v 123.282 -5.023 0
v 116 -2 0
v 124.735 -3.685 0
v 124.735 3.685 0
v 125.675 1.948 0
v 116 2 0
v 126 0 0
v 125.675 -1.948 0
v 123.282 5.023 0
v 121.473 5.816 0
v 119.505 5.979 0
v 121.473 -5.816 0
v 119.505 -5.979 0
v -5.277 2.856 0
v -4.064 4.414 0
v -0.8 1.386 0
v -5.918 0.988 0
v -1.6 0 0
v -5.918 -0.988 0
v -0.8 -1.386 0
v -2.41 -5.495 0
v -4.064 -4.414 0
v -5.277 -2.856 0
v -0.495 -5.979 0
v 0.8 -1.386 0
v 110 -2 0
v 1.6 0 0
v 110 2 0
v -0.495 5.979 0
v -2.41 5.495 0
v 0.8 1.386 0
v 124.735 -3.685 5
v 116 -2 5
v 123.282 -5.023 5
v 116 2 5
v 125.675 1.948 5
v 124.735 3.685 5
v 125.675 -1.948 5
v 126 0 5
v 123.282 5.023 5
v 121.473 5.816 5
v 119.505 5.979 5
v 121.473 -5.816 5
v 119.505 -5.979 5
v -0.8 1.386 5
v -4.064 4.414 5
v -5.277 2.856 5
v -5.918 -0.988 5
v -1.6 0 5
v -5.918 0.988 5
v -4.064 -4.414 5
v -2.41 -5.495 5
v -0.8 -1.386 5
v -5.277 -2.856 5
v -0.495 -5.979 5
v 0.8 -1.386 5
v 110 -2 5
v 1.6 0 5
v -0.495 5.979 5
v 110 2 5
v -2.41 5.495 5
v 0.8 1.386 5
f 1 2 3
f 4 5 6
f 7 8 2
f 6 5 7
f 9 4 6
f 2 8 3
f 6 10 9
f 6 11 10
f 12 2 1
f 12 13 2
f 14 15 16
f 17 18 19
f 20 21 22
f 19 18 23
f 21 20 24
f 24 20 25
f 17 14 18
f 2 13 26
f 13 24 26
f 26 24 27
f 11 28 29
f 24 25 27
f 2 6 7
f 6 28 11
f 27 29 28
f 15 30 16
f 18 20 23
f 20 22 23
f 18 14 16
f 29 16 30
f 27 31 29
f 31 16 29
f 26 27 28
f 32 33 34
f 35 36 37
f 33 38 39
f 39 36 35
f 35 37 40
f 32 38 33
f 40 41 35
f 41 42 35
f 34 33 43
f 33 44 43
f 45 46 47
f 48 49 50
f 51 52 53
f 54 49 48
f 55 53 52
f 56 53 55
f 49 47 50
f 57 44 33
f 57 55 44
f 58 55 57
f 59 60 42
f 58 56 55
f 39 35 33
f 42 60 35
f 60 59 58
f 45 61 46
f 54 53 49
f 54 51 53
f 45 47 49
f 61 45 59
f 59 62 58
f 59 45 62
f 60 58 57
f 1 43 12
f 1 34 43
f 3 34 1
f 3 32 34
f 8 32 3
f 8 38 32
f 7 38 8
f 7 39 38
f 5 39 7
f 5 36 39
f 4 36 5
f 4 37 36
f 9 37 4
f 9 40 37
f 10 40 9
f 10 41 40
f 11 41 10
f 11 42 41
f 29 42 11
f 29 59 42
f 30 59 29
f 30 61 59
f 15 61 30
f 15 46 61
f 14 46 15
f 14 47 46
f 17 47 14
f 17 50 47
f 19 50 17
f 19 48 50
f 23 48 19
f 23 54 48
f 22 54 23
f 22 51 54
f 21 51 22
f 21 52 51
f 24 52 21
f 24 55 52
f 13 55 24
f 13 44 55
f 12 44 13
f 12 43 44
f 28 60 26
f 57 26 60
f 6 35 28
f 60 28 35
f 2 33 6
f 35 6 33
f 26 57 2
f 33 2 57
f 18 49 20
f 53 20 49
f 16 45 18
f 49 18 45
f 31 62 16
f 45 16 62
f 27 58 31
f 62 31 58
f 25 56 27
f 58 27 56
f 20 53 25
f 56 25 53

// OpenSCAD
arm_len = 120; arm_w = 12; arm_t = 5; hole = 3.2; hook_gap = 4;
linear_extrude(height=arm_t)
difference(){
  hull(){ circle(r=6); translate([arm_len,0]) circle(r=6); }
  translate([0,0]) circle(r=hole/2);
  translate([arm_len-10, -hook_gap/2]) square([6, hook_gap]);
}
